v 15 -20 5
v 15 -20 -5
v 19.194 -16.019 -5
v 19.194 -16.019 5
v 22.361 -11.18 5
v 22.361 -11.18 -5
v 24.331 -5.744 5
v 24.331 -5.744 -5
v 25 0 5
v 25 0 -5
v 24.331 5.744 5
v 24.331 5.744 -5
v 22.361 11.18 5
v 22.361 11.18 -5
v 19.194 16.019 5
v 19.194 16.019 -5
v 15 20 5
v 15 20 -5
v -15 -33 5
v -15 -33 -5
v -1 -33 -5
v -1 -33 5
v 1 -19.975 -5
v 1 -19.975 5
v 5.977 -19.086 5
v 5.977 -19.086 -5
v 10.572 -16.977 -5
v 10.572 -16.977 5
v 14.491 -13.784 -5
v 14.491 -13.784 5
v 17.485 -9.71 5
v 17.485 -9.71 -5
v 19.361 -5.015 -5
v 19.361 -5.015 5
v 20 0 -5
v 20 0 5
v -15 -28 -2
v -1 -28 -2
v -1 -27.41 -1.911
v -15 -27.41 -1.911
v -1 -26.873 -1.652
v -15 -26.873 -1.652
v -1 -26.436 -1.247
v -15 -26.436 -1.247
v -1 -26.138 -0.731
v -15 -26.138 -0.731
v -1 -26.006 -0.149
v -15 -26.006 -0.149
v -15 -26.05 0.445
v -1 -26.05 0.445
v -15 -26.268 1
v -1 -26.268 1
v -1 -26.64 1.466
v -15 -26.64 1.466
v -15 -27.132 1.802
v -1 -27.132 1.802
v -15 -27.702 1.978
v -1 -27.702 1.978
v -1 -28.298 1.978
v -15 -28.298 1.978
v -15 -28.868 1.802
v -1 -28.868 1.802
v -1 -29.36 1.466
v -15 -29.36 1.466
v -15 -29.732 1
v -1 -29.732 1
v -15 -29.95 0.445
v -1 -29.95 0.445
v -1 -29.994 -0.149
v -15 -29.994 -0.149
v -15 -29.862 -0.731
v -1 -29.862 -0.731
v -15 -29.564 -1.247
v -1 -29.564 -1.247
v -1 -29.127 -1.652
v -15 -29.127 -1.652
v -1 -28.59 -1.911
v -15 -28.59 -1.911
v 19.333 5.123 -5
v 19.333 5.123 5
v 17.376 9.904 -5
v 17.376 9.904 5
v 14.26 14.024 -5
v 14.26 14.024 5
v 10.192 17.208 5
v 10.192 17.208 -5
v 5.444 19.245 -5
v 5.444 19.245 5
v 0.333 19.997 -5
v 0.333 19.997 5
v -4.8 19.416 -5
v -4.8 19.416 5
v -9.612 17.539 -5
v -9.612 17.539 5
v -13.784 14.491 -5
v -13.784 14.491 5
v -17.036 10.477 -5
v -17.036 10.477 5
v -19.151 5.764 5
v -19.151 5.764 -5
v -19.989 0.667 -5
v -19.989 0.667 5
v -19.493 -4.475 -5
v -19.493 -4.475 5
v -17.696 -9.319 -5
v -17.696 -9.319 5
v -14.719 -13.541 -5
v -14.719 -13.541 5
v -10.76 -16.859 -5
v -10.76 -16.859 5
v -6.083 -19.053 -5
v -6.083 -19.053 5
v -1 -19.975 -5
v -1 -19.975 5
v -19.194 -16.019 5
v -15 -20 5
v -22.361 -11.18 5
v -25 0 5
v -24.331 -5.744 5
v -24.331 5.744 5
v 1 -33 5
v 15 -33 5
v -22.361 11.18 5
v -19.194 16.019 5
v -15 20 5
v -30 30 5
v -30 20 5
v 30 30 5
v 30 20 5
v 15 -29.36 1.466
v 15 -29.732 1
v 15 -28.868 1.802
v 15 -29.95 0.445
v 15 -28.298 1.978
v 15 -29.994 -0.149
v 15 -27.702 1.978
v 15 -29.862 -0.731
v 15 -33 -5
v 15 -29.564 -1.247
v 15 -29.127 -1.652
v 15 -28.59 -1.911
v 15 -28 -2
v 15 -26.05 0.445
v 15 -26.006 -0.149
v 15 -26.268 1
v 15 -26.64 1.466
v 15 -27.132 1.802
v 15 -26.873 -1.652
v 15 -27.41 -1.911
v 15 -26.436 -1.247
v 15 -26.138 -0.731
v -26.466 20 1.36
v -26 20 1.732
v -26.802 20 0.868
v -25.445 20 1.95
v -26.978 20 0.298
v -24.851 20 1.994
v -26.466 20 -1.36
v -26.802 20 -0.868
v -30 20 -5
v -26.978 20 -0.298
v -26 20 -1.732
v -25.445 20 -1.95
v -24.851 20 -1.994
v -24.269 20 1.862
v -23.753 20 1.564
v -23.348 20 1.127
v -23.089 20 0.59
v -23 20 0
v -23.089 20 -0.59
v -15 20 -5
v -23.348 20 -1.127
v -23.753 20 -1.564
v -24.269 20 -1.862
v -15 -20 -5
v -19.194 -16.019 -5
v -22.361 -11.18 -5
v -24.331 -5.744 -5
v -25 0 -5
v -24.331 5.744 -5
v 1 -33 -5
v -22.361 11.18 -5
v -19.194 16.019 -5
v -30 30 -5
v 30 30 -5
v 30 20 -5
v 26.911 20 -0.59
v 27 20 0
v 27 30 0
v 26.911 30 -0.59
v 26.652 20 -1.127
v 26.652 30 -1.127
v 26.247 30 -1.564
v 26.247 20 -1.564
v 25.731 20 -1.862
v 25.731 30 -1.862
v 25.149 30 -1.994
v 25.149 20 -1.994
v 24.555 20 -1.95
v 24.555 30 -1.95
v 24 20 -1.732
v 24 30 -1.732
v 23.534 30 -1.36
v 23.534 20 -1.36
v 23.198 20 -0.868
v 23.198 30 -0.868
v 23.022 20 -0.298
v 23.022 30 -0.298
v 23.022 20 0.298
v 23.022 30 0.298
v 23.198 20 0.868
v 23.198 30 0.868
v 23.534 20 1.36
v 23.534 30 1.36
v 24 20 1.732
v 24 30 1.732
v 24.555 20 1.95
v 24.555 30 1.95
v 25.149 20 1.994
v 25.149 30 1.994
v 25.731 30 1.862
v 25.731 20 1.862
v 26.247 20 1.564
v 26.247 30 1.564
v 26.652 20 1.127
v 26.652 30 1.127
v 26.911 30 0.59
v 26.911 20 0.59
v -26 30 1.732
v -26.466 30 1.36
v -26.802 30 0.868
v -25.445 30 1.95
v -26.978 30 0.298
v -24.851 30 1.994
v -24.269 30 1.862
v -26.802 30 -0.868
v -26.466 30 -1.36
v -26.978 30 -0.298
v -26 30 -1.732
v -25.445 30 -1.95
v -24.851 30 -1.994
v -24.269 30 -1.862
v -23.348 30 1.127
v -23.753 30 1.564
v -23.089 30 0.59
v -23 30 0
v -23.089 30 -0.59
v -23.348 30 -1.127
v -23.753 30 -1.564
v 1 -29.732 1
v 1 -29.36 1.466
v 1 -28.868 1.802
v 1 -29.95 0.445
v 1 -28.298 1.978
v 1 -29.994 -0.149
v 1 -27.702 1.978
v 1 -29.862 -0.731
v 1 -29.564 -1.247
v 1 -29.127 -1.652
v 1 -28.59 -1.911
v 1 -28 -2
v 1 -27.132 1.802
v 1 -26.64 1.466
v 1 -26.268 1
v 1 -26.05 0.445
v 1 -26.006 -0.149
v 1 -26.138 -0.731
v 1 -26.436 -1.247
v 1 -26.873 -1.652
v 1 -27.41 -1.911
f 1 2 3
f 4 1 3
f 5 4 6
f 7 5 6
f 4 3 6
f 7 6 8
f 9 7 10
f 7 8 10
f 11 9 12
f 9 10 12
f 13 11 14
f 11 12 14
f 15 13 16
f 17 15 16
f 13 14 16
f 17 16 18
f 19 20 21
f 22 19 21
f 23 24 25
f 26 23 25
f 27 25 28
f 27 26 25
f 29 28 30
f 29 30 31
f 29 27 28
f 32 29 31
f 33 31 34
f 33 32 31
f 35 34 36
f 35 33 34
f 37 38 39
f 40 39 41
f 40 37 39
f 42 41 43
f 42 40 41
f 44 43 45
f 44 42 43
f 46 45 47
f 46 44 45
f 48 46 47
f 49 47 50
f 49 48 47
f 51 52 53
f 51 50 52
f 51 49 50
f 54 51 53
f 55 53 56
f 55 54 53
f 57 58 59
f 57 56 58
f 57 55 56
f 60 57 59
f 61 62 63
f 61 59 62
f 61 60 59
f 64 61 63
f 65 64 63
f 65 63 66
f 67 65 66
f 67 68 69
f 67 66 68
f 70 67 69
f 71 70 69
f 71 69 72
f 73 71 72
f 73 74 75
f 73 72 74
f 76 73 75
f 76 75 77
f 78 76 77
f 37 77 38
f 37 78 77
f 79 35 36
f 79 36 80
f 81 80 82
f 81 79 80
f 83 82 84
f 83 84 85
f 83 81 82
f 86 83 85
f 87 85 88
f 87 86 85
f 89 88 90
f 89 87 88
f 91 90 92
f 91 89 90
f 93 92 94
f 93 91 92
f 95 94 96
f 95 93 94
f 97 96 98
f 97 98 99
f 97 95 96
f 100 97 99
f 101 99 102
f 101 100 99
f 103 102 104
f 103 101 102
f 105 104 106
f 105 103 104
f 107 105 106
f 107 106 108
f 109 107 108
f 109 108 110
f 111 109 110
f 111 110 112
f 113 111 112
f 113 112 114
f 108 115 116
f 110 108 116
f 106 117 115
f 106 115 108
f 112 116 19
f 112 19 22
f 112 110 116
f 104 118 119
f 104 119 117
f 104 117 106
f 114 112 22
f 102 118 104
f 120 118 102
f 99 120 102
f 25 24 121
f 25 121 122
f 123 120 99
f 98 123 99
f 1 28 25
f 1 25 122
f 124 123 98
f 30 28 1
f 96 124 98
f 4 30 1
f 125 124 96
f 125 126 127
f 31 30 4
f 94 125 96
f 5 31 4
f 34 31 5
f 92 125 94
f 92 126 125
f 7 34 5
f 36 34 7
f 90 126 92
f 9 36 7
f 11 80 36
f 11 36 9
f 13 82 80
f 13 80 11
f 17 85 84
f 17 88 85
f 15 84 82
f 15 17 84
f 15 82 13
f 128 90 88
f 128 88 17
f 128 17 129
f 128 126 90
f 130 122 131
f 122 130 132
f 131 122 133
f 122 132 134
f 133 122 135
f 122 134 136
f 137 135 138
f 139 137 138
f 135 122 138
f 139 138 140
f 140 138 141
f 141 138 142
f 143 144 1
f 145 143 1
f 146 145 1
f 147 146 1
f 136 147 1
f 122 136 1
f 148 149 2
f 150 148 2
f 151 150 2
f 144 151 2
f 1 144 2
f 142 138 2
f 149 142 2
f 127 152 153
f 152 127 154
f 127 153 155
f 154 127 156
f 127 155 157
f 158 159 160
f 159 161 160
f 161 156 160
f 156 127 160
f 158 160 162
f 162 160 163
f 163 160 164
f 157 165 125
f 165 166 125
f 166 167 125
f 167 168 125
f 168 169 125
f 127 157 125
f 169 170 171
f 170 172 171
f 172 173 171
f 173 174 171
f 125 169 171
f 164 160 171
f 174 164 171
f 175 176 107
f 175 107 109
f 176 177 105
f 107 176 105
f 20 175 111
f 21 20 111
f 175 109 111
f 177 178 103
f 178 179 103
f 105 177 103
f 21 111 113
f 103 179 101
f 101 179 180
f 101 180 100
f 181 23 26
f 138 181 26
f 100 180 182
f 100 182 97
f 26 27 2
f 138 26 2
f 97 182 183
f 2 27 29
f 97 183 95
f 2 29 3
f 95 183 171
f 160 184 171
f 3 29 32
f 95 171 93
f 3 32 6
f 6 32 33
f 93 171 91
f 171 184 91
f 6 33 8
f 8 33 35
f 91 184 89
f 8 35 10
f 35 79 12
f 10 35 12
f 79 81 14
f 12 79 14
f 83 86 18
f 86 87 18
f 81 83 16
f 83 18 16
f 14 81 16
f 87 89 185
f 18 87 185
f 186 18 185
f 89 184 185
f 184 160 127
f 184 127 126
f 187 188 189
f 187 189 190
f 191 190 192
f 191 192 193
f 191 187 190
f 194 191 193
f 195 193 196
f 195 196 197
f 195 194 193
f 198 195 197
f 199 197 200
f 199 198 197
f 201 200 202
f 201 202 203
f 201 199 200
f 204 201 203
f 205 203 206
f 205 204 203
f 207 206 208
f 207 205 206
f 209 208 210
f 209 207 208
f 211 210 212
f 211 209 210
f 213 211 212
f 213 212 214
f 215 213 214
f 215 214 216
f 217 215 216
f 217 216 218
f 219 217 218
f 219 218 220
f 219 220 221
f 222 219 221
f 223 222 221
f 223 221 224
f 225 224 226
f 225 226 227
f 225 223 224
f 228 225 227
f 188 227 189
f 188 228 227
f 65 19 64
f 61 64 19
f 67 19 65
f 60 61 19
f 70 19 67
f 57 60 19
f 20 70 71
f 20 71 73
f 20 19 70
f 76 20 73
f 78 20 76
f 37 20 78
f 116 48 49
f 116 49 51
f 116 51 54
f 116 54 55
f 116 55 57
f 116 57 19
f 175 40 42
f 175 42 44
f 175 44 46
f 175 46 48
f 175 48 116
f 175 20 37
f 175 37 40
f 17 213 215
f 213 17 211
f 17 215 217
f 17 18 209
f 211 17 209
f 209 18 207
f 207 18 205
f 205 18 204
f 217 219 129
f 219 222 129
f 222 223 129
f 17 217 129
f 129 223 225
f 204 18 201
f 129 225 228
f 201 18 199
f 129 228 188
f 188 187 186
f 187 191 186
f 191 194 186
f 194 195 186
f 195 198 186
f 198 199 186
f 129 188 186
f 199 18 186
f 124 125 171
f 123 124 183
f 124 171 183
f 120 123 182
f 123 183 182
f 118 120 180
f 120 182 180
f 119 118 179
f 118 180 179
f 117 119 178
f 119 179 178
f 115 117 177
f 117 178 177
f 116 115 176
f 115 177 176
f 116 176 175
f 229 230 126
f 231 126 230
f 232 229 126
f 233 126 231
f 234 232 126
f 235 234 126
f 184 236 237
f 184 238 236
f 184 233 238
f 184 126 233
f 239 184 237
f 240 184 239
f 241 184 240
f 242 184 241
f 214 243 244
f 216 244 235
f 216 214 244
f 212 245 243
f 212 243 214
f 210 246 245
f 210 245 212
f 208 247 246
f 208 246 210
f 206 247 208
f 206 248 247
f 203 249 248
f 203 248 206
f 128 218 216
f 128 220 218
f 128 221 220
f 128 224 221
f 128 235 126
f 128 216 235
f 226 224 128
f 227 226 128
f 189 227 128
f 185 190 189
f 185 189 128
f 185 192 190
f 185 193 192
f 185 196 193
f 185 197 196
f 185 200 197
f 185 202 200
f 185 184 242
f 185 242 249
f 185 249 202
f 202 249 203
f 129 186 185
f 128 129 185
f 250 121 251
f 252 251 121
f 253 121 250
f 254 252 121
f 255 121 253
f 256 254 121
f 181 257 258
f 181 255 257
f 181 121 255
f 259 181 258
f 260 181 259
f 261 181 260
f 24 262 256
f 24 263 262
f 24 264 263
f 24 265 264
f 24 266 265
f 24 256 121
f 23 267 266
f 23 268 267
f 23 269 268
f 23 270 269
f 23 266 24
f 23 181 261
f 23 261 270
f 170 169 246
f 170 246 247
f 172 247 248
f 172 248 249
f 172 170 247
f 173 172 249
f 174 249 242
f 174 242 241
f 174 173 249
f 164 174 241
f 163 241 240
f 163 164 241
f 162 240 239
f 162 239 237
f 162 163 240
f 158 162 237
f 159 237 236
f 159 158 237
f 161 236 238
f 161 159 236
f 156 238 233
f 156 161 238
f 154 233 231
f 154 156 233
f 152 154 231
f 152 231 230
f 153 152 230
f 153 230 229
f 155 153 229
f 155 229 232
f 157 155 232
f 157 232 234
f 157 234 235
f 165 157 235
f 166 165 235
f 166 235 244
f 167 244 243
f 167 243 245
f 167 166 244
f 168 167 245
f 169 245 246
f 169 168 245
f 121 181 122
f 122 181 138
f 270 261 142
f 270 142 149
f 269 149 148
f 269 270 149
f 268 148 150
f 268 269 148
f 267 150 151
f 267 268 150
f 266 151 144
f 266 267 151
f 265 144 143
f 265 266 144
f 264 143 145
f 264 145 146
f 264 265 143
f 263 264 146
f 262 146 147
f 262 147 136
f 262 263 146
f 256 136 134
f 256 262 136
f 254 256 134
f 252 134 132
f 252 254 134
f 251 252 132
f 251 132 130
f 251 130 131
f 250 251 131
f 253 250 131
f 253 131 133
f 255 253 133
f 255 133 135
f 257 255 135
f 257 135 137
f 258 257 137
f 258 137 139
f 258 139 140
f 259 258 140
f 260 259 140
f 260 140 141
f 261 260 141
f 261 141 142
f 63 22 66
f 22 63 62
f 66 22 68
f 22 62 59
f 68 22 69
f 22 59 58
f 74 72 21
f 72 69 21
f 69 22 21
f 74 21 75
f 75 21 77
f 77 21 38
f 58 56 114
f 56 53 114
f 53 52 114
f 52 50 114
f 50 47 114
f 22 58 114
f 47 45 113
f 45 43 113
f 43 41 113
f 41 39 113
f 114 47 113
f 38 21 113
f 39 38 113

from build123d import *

# Parameters (mm, degrees)
CYLINDER002_R     = 2
CYLINDER002_DEPTH = 10
CYLINDER001_R     = 20
CYLINDER001_DEPTH = 10
CYLINDER004_R     = 2
CYLINDER004_DEPTH = 30
BOX002_W          = 2
BOX002_H          = 15
BOX002_DEPTH      = 10
CYLINDER003_R     = 2
CYLINDER003_DEPTH = 10
BOX_W             = 60
BOX_H             = 10
BOX_DEPTH         = 10
BOX001_W          = 30
BOX001_H          = 15
BOX001_DEPTH      = 10
CYLINDER_R        = 25
CYLINDER_DEPTH    = 10


with BuildPart() as cylinder002:
    # Cylinder002 → Cylinder002 (new body)
    with BuildSketch(Plane(origin=(25, 20, 0), x_dir=(1, 0, 0), z_dir=(0, 1, 0))):
        Circle(CYLINDER002_R)
    extrude(amount=CYLINDER002_DEPTH)


with BuildPart() as cylinder001:
    # Cylinder001 → Cylinder001 (new body)
    with BuildSketch(Plane.XY.offset(-5)):
        Circle(CYLINDER001_R)
    extrude(amount=CYLINDER001_DEPTH)


with BuildPart() as cylinder004:
    # Cylinder004 → Cylinder004 (new body)
    with BuildSketch(Plane(origin=(-15, -28, 0), x_dir=(0, 0, -1), z_dir=(1, 0, 0))):
        Circle(CYLINDER004_R)
    extrude(amount=CYLINDER004_DEPTH)


with BuildPart() as cube002:
    # Box002 → Box002 (new body)
    with BuildSketch(Plane(origin=(-1, -33, -5), x_dir=(1, 0, 0), z_dir=(0, 0, 1))):
        with Locations((1, 7.5)):
            Rectangle(BOX002_W, BOX002_H)
    extrude(amount=BOX002_DEPTH)


with BuildPart() as negative_fusion:
    # Cylinder003 → Cylinder003 (new body)
    with BuildSketch(Plane(origin=(-25, 20, 0), x_dir=(1, 0, 0), z_dir=(0, 1, 0))):
        Circle(CYLINDER003_R)
    extrude(amount=CYLINDER003_DEPTH)

    # Fusion001: union Cylinder002, Cylinder001, Cylinder004, Cube002
    add(cylinder002.part)
    add(cylinder001.part)
    add(cylinder004.part)
    add(cube002.part)


with BuildPart() as cube:
    # Box → Box (new body)
    with BuildSketch(Plane(origin=(-30, 20, -5), x_dir=(1, 0, 0), z_dir=(0, 0, 1))):
        with Locations((30, 5)):
            Rectangle(BOX_W, BOX_H)
    extrude(amount=BOX_DEPTH)


with BuildPart() as cube001:
    # Box001 → Box001 (new body)
    with BuildSketch(Plane(origin=(-15, -33, -5), x_dir=(1, 0, 0), z_dir=(0, 0, 1))):
        with Locations((15, 7.5)):
            Rectangle(BOX001_W, BOX001_H)
    extrude(amount=BOX001_DEPTH)


with BuildPart() as cut:
    # Cylinder → Cylinder (new body)
    with BuildSketch(Plane.XY.offset(-5)):
        Circle(CYLINDER_R)
    extrude(amount=CYLINDER_DEPTH)

    # Fusion: union Cube, Cube001
    add(cube.part)
    add(cube001.part)

    # Cut: cut Negative Fusion
    add(negative_fusion.part, mode=Mode.SUBTRACT)


solid = cut.part
